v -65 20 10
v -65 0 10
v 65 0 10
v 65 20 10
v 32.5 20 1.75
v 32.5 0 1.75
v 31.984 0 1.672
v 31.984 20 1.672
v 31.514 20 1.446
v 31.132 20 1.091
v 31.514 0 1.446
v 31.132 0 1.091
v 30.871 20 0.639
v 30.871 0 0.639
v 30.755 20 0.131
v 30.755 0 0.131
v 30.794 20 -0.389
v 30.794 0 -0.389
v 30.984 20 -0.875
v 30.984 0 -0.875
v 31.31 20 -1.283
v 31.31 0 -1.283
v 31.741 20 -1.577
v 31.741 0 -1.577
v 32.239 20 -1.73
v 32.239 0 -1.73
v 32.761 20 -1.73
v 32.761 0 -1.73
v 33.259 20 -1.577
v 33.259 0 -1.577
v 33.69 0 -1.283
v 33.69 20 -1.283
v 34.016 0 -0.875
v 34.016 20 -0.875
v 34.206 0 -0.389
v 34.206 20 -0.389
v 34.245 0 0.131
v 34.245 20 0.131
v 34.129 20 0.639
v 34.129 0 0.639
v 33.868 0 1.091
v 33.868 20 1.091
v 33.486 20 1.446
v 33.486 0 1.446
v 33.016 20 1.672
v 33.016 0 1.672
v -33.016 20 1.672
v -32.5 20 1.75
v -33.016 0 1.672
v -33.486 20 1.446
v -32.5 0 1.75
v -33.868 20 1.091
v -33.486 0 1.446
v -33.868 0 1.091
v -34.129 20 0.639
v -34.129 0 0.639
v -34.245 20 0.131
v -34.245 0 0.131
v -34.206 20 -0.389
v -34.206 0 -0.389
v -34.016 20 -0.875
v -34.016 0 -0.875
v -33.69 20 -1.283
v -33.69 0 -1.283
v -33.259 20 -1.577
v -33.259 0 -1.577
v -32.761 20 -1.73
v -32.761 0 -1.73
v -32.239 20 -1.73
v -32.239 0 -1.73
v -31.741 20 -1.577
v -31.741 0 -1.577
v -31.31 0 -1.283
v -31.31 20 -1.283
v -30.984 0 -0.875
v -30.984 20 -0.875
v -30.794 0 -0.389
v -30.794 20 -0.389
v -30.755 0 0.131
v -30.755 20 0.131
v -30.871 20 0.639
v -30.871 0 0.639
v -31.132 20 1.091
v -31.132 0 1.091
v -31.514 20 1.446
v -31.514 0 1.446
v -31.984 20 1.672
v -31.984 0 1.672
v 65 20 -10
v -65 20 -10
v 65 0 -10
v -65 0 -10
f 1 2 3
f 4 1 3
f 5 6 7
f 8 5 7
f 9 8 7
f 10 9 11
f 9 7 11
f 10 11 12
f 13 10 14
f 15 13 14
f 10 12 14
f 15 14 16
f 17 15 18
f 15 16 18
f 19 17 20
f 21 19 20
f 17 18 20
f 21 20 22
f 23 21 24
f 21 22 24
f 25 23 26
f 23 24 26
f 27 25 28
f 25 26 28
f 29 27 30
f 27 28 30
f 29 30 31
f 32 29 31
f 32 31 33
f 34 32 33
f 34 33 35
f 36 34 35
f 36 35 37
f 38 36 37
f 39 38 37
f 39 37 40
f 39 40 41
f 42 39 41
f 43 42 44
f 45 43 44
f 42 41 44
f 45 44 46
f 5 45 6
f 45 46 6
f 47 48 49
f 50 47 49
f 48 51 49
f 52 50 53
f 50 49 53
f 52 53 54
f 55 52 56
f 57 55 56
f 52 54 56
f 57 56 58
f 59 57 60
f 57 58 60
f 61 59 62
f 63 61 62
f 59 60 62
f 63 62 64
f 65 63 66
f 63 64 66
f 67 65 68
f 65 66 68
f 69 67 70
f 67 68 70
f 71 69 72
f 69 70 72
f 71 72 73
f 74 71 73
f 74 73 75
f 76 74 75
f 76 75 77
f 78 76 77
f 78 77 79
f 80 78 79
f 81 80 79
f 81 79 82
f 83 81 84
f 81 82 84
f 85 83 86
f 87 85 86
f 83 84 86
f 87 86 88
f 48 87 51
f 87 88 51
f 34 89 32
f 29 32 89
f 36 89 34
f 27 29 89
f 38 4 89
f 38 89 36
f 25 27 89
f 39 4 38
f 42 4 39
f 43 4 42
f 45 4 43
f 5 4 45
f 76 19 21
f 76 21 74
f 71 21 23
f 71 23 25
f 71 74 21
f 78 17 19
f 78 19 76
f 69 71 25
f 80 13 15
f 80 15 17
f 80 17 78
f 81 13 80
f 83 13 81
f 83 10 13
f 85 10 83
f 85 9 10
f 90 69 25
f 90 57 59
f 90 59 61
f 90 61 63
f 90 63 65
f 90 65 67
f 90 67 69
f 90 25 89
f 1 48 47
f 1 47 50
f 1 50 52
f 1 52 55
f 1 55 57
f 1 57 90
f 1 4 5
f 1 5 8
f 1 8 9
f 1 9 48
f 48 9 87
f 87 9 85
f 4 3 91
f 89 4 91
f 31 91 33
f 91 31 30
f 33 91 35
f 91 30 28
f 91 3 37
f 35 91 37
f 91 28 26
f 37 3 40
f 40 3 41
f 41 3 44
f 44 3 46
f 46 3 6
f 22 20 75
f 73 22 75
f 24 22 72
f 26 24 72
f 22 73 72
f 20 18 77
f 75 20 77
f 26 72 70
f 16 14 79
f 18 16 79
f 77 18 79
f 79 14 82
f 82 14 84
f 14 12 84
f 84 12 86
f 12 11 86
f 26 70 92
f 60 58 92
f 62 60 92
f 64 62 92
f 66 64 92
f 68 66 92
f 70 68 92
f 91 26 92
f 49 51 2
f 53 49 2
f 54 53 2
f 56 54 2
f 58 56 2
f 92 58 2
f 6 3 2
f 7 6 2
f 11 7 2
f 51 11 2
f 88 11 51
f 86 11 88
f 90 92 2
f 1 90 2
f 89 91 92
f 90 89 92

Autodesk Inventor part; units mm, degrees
ref_plane "YZ Plane" through (0, 0, 0) normal (1, 0, 0) x (0, 1, 0)
ref_plane "XZ Plane" through (0, 0, 0) normal (0, 1, 0) x (-1, 0, 0)
ref_plane "XY Plane" through (0, 0, 0) normal (0, 0, 1) x (1, 0, 0)
sketch "스케치2" plane through (0, 0, 0) normal (0, 1, 0) x (-1, 0, 0)
  line L0 (65, 10) -> (-65, 10)
  line L1 (-65, 10) -> (-65, -10)
  line L2 (-65, -10) -> (65, -10)
  line L3 (65, -10) -> (65, 10)
  line L4 (65, 10) -> (-65, -10) construction
  line L5 (-65, 10) -> (65, -10) construction
  point P0 (0, 0)
  dimension "d2" = 130
  dimension "d4" = 20
extrude "돌출2" add sketch "스케치2" along normal blind 20
sketch "스케치3" plane through (0, 20, 0) normal (0, 1, 0) x (1, 0, 0)
  point P0 (0, 0)
  point P1 (32.5, 0)
  point P2 (-32.5, 0)
  dimension "d7" = 32.5
  dimension "d8" = 32.5
hole "구멍1" at (32.5, 20, 0) at (-32.5, 20, 0) direction (0, -1, 0) diameter 3.5 end through all
equation "\"d8\" = d7"
properties part number "3D지지대"
